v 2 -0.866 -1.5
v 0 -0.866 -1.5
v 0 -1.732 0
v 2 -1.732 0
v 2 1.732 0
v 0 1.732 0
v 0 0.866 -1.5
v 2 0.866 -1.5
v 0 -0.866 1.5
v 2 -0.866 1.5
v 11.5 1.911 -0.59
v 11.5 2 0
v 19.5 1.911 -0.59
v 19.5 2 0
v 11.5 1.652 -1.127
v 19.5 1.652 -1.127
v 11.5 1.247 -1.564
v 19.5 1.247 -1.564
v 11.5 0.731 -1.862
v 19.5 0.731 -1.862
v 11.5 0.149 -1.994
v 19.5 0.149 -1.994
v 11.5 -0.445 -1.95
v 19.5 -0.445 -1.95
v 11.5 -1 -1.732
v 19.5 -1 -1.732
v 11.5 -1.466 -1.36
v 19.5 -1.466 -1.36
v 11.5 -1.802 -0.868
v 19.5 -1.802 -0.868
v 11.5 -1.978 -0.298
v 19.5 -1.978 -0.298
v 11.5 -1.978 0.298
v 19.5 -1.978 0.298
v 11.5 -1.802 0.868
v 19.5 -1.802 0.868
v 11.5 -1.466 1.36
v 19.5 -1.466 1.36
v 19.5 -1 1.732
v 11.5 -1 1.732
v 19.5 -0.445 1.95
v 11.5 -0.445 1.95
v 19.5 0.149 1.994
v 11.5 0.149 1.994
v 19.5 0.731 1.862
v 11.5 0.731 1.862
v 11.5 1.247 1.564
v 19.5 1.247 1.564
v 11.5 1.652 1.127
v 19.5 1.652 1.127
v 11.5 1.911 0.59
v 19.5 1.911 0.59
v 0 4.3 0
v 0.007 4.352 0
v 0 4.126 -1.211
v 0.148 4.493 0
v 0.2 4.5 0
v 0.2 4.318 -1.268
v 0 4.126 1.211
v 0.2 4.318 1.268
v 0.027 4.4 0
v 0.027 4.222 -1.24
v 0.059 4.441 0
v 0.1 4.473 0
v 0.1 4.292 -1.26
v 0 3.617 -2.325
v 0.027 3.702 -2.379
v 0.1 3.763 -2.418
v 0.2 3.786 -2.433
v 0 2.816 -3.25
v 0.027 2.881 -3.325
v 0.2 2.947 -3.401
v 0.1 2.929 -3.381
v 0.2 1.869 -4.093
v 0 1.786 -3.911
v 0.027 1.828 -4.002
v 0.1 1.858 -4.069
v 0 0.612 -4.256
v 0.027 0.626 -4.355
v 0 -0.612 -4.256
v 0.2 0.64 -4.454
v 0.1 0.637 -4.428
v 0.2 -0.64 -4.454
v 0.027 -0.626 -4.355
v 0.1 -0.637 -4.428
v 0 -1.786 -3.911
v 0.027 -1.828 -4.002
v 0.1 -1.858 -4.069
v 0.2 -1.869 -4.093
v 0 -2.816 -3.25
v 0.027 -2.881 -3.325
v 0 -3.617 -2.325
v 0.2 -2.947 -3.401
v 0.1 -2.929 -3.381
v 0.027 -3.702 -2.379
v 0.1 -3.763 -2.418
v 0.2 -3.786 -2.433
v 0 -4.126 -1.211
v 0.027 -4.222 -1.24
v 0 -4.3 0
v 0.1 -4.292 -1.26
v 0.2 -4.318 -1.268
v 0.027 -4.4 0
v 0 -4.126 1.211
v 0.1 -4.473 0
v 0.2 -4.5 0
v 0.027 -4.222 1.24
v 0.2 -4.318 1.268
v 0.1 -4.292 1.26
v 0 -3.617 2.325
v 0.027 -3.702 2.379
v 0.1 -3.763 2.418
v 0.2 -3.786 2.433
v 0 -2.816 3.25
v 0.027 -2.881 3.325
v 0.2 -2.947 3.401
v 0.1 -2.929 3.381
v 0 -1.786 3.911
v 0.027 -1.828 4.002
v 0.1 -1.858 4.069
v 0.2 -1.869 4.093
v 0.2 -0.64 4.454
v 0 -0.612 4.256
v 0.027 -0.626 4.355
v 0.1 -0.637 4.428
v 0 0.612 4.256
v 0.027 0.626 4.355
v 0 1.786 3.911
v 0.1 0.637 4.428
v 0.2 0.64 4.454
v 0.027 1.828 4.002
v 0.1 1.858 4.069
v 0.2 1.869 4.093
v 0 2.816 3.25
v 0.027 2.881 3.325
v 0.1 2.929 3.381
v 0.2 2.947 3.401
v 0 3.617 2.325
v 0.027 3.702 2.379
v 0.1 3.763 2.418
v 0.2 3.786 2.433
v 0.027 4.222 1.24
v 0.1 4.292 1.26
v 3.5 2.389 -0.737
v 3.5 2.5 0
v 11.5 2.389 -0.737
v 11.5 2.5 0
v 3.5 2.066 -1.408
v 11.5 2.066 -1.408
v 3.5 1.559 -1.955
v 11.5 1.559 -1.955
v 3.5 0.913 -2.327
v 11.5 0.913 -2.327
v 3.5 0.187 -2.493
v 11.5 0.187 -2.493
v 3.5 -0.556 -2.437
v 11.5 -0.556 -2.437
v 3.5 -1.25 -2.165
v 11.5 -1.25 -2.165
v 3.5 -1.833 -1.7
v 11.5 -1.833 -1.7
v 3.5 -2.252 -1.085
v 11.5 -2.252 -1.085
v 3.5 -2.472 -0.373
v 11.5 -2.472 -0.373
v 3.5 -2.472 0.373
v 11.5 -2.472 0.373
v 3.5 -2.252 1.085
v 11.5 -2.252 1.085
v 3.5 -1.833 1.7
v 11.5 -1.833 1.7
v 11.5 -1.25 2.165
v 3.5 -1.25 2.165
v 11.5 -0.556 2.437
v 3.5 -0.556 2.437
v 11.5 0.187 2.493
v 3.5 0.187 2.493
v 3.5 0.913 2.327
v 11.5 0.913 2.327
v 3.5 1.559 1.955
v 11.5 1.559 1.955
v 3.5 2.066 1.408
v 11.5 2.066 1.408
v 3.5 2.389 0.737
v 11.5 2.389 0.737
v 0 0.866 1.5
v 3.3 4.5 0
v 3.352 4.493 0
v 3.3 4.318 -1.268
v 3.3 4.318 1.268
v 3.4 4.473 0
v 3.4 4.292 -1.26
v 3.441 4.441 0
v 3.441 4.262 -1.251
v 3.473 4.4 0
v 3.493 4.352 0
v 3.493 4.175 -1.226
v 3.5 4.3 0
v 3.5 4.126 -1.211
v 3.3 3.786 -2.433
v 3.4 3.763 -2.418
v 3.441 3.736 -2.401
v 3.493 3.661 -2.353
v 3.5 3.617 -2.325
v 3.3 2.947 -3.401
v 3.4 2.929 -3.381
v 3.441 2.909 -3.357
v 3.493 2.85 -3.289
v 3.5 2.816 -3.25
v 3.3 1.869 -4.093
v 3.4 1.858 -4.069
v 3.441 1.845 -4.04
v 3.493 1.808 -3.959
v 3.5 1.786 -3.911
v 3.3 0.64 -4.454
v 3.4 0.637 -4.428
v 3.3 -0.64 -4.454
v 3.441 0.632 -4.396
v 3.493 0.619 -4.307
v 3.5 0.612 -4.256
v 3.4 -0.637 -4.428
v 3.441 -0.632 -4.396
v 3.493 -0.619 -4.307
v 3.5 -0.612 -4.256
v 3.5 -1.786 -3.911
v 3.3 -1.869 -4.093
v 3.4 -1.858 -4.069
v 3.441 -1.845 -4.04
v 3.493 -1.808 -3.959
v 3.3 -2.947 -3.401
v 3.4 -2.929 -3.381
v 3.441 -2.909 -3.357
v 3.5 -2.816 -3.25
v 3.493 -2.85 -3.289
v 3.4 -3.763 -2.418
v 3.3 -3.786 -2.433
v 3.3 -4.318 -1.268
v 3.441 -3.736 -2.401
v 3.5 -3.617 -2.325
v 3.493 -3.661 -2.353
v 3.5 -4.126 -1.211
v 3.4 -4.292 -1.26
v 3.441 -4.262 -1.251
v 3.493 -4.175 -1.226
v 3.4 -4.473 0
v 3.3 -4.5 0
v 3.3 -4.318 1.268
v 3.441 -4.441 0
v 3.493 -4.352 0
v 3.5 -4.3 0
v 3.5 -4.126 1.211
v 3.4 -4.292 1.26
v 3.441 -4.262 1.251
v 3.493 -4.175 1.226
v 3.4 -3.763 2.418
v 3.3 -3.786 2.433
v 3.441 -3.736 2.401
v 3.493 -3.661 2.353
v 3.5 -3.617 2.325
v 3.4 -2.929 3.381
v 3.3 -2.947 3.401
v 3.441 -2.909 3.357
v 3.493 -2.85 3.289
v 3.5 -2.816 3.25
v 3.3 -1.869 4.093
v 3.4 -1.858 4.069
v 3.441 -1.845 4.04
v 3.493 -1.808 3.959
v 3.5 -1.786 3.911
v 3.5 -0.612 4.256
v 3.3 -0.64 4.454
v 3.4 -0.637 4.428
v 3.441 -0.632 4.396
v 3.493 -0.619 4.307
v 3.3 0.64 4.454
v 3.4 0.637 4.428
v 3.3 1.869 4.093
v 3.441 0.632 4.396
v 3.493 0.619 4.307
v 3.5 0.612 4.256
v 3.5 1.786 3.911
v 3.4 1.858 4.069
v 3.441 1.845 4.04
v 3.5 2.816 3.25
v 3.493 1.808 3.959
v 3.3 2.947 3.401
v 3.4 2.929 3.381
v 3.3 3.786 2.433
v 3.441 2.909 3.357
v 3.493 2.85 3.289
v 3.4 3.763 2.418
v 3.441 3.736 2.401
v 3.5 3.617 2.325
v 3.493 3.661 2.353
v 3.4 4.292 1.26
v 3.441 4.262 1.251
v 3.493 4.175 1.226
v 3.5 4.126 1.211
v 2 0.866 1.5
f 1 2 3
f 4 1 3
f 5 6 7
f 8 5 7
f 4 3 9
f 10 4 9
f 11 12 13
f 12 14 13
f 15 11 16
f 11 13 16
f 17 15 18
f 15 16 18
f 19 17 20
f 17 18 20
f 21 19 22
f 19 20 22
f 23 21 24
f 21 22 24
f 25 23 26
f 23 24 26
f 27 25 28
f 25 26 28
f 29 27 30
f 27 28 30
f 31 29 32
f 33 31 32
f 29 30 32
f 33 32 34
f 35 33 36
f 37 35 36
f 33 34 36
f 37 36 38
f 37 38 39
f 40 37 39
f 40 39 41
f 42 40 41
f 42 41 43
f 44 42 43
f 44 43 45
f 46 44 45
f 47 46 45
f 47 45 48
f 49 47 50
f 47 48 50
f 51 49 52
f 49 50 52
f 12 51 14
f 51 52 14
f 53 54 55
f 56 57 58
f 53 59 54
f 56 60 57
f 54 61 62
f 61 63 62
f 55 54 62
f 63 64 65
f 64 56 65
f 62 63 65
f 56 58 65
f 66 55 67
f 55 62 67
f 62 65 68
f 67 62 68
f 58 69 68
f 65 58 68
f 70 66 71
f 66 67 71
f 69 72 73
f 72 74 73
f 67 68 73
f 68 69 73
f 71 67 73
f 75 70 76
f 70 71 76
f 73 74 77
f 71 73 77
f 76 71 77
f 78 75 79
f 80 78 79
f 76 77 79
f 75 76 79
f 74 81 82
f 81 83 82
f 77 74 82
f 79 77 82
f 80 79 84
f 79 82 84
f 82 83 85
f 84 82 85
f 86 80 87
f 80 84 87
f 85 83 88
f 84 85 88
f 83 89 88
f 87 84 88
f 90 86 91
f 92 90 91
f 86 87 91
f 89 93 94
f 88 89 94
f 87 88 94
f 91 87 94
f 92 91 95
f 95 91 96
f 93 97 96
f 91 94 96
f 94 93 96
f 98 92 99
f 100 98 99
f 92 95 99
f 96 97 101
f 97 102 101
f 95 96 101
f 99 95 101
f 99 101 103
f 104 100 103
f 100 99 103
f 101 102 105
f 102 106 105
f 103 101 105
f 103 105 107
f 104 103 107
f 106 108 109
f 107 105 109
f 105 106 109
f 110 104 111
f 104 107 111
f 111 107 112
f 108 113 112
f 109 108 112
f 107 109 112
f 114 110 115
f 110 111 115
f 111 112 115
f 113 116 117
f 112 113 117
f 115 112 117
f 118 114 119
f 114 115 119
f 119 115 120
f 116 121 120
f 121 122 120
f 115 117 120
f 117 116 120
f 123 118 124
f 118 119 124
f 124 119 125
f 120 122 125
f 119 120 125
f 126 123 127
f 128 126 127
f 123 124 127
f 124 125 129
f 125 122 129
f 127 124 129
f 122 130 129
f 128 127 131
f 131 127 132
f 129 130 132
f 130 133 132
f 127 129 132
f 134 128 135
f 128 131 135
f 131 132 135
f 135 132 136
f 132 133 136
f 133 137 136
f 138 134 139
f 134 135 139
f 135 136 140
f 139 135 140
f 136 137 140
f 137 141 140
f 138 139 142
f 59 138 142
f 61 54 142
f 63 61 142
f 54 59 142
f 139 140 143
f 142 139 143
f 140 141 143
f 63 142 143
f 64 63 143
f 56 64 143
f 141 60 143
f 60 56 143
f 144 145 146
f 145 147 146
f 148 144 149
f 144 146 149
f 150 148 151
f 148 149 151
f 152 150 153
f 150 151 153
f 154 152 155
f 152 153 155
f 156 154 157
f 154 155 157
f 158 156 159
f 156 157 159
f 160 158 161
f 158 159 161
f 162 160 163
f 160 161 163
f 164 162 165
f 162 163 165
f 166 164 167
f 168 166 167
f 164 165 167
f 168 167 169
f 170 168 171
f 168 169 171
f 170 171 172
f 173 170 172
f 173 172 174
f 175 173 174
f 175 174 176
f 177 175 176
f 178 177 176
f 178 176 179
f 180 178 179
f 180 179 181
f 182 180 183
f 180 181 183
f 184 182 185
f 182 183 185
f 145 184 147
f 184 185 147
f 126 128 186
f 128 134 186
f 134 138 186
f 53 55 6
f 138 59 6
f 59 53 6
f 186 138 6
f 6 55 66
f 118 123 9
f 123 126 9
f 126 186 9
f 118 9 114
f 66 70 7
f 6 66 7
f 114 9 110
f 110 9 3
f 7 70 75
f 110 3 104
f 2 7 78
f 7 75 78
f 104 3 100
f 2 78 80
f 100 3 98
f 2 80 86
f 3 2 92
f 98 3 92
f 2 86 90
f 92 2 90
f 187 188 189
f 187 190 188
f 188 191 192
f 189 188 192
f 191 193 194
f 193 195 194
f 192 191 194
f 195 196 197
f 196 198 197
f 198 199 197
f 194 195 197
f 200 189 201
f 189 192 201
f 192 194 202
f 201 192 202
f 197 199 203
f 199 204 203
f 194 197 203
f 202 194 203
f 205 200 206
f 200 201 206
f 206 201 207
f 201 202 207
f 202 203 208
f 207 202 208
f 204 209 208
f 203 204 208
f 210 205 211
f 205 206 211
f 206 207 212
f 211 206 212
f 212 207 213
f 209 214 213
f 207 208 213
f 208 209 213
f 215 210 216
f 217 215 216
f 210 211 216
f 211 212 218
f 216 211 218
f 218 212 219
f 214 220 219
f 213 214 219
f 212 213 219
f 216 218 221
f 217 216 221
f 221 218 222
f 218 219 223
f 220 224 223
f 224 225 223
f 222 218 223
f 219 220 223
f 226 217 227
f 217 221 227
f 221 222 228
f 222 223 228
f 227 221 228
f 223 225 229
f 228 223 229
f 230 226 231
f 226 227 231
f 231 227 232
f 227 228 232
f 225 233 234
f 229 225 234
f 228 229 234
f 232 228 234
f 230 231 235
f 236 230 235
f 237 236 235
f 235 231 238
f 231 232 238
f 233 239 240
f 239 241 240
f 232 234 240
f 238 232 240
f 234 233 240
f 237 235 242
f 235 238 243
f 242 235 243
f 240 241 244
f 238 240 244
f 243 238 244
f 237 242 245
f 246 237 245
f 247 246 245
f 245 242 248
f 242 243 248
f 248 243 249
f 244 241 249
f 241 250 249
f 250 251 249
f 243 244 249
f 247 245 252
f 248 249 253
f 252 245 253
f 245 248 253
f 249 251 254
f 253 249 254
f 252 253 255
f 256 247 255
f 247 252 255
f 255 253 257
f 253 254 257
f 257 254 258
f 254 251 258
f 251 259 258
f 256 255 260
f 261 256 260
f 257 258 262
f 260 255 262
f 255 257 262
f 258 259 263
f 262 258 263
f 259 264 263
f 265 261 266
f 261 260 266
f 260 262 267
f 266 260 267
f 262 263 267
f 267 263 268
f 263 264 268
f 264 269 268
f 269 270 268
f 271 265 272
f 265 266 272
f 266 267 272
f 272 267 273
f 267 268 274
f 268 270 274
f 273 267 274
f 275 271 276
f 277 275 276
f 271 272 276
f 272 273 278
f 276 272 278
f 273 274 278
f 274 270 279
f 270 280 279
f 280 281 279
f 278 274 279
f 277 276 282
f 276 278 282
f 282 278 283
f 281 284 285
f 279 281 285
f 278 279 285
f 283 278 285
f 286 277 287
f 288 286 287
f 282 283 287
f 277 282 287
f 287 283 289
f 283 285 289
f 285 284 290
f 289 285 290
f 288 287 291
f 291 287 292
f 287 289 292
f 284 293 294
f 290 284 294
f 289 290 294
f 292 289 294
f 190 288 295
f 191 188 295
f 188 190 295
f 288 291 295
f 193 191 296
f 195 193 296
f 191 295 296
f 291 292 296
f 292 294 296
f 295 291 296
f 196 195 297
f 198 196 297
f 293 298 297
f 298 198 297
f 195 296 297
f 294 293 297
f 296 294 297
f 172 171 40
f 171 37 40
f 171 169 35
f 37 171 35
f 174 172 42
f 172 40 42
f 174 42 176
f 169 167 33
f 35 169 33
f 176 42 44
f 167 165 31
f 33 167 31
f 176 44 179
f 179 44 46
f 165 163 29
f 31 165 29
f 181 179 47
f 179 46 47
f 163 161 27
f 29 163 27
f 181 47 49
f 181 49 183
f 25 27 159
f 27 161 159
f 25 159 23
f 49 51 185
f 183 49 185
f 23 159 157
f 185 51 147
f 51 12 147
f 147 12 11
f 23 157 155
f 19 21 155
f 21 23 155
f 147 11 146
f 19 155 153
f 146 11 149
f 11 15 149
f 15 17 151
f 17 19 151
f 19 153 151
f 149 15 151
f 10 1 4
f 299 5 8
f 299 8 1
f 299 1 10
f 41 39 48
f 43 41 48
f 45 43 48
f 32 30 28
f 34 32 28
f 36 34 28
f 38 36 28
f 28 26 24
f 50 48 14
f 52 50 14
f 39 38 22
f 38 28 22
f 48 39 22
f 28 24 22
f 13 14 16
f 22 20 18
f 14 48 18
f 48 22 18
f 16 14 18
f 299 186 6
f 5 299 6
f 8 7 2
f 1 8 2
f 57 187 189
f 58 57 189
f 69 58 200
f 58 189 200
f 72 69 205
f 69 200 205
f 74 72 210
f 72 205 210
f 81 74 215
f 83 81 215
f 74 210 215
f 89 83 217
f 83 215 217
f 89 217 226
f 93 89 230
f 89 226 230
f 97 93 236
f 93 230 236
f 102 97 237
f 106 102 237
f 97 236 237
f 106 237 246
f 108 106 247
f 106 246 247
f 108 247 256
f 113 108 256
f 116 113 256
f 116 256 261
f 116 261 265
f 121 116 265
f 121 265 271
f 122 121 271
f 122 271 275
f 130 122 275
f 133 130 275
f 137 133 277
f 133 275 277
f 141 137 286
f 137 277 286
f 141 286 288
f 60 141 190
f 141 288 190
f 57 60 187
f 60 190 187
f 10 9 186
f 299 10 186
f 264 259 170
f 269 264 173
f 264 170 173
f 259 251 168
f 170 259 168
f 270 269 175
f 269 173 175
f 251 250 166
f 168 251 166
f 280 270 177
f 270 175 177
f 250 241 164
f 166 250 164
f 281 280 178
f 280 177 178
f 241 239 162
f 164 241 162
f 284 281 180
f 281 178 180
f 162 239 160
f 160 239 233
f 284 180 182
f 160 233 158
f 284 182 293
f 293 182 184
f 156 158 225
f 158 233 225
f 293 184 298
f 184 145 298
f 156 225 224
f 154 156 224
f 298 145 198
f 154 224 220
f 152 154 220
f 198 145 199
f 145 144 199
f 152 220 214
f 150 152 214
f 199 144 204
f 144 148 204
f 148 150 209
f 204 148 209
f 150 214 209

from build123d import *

# Parameters (mm, degrees)
CUT_EXTRUDE_1_DEPTH = 2
FILLET_1_R          = 0.2


with BuildPart() as part:
    # 草图1 → 旋转1 (revolve)
    with BuildSketch(Plane.XY):
        Polygon((0, 0), (0, 4.5), (3.5, 4.5), (3.5, 2.5), (11.5, 2.5), (11.5, 2), (19.5, 2), (19.5, 0), align=None)
    revolve(axis=Axis((19.5, 0, 0), (-1, 0, 0)))

    # 草图2 → 切除-拉伸1 (cut)
    with BuildSketch(Plane.ZY):
        Polygon((1.5, 0.866025404), (0, 1.732050808), (-1.5, 0.866025404), (-1.5, -0.866025404), (0, -1.732050808), (1.5, -0.866025404), align=None)
    extrude(amount=-CUT_EXTRUDE_1_DEPTH, mode=Mode.SUBTRACT)

    # 圆角1
    fillet_1_edges = [part.edges().sort_by_distance(p)[0] for p in [
        (3.5, -4.5, 0),
        (0, -4.5, 0),
    ]]
    fillet(fillet_1_edges, radius=FILLET_1_R)


solid = part.part
